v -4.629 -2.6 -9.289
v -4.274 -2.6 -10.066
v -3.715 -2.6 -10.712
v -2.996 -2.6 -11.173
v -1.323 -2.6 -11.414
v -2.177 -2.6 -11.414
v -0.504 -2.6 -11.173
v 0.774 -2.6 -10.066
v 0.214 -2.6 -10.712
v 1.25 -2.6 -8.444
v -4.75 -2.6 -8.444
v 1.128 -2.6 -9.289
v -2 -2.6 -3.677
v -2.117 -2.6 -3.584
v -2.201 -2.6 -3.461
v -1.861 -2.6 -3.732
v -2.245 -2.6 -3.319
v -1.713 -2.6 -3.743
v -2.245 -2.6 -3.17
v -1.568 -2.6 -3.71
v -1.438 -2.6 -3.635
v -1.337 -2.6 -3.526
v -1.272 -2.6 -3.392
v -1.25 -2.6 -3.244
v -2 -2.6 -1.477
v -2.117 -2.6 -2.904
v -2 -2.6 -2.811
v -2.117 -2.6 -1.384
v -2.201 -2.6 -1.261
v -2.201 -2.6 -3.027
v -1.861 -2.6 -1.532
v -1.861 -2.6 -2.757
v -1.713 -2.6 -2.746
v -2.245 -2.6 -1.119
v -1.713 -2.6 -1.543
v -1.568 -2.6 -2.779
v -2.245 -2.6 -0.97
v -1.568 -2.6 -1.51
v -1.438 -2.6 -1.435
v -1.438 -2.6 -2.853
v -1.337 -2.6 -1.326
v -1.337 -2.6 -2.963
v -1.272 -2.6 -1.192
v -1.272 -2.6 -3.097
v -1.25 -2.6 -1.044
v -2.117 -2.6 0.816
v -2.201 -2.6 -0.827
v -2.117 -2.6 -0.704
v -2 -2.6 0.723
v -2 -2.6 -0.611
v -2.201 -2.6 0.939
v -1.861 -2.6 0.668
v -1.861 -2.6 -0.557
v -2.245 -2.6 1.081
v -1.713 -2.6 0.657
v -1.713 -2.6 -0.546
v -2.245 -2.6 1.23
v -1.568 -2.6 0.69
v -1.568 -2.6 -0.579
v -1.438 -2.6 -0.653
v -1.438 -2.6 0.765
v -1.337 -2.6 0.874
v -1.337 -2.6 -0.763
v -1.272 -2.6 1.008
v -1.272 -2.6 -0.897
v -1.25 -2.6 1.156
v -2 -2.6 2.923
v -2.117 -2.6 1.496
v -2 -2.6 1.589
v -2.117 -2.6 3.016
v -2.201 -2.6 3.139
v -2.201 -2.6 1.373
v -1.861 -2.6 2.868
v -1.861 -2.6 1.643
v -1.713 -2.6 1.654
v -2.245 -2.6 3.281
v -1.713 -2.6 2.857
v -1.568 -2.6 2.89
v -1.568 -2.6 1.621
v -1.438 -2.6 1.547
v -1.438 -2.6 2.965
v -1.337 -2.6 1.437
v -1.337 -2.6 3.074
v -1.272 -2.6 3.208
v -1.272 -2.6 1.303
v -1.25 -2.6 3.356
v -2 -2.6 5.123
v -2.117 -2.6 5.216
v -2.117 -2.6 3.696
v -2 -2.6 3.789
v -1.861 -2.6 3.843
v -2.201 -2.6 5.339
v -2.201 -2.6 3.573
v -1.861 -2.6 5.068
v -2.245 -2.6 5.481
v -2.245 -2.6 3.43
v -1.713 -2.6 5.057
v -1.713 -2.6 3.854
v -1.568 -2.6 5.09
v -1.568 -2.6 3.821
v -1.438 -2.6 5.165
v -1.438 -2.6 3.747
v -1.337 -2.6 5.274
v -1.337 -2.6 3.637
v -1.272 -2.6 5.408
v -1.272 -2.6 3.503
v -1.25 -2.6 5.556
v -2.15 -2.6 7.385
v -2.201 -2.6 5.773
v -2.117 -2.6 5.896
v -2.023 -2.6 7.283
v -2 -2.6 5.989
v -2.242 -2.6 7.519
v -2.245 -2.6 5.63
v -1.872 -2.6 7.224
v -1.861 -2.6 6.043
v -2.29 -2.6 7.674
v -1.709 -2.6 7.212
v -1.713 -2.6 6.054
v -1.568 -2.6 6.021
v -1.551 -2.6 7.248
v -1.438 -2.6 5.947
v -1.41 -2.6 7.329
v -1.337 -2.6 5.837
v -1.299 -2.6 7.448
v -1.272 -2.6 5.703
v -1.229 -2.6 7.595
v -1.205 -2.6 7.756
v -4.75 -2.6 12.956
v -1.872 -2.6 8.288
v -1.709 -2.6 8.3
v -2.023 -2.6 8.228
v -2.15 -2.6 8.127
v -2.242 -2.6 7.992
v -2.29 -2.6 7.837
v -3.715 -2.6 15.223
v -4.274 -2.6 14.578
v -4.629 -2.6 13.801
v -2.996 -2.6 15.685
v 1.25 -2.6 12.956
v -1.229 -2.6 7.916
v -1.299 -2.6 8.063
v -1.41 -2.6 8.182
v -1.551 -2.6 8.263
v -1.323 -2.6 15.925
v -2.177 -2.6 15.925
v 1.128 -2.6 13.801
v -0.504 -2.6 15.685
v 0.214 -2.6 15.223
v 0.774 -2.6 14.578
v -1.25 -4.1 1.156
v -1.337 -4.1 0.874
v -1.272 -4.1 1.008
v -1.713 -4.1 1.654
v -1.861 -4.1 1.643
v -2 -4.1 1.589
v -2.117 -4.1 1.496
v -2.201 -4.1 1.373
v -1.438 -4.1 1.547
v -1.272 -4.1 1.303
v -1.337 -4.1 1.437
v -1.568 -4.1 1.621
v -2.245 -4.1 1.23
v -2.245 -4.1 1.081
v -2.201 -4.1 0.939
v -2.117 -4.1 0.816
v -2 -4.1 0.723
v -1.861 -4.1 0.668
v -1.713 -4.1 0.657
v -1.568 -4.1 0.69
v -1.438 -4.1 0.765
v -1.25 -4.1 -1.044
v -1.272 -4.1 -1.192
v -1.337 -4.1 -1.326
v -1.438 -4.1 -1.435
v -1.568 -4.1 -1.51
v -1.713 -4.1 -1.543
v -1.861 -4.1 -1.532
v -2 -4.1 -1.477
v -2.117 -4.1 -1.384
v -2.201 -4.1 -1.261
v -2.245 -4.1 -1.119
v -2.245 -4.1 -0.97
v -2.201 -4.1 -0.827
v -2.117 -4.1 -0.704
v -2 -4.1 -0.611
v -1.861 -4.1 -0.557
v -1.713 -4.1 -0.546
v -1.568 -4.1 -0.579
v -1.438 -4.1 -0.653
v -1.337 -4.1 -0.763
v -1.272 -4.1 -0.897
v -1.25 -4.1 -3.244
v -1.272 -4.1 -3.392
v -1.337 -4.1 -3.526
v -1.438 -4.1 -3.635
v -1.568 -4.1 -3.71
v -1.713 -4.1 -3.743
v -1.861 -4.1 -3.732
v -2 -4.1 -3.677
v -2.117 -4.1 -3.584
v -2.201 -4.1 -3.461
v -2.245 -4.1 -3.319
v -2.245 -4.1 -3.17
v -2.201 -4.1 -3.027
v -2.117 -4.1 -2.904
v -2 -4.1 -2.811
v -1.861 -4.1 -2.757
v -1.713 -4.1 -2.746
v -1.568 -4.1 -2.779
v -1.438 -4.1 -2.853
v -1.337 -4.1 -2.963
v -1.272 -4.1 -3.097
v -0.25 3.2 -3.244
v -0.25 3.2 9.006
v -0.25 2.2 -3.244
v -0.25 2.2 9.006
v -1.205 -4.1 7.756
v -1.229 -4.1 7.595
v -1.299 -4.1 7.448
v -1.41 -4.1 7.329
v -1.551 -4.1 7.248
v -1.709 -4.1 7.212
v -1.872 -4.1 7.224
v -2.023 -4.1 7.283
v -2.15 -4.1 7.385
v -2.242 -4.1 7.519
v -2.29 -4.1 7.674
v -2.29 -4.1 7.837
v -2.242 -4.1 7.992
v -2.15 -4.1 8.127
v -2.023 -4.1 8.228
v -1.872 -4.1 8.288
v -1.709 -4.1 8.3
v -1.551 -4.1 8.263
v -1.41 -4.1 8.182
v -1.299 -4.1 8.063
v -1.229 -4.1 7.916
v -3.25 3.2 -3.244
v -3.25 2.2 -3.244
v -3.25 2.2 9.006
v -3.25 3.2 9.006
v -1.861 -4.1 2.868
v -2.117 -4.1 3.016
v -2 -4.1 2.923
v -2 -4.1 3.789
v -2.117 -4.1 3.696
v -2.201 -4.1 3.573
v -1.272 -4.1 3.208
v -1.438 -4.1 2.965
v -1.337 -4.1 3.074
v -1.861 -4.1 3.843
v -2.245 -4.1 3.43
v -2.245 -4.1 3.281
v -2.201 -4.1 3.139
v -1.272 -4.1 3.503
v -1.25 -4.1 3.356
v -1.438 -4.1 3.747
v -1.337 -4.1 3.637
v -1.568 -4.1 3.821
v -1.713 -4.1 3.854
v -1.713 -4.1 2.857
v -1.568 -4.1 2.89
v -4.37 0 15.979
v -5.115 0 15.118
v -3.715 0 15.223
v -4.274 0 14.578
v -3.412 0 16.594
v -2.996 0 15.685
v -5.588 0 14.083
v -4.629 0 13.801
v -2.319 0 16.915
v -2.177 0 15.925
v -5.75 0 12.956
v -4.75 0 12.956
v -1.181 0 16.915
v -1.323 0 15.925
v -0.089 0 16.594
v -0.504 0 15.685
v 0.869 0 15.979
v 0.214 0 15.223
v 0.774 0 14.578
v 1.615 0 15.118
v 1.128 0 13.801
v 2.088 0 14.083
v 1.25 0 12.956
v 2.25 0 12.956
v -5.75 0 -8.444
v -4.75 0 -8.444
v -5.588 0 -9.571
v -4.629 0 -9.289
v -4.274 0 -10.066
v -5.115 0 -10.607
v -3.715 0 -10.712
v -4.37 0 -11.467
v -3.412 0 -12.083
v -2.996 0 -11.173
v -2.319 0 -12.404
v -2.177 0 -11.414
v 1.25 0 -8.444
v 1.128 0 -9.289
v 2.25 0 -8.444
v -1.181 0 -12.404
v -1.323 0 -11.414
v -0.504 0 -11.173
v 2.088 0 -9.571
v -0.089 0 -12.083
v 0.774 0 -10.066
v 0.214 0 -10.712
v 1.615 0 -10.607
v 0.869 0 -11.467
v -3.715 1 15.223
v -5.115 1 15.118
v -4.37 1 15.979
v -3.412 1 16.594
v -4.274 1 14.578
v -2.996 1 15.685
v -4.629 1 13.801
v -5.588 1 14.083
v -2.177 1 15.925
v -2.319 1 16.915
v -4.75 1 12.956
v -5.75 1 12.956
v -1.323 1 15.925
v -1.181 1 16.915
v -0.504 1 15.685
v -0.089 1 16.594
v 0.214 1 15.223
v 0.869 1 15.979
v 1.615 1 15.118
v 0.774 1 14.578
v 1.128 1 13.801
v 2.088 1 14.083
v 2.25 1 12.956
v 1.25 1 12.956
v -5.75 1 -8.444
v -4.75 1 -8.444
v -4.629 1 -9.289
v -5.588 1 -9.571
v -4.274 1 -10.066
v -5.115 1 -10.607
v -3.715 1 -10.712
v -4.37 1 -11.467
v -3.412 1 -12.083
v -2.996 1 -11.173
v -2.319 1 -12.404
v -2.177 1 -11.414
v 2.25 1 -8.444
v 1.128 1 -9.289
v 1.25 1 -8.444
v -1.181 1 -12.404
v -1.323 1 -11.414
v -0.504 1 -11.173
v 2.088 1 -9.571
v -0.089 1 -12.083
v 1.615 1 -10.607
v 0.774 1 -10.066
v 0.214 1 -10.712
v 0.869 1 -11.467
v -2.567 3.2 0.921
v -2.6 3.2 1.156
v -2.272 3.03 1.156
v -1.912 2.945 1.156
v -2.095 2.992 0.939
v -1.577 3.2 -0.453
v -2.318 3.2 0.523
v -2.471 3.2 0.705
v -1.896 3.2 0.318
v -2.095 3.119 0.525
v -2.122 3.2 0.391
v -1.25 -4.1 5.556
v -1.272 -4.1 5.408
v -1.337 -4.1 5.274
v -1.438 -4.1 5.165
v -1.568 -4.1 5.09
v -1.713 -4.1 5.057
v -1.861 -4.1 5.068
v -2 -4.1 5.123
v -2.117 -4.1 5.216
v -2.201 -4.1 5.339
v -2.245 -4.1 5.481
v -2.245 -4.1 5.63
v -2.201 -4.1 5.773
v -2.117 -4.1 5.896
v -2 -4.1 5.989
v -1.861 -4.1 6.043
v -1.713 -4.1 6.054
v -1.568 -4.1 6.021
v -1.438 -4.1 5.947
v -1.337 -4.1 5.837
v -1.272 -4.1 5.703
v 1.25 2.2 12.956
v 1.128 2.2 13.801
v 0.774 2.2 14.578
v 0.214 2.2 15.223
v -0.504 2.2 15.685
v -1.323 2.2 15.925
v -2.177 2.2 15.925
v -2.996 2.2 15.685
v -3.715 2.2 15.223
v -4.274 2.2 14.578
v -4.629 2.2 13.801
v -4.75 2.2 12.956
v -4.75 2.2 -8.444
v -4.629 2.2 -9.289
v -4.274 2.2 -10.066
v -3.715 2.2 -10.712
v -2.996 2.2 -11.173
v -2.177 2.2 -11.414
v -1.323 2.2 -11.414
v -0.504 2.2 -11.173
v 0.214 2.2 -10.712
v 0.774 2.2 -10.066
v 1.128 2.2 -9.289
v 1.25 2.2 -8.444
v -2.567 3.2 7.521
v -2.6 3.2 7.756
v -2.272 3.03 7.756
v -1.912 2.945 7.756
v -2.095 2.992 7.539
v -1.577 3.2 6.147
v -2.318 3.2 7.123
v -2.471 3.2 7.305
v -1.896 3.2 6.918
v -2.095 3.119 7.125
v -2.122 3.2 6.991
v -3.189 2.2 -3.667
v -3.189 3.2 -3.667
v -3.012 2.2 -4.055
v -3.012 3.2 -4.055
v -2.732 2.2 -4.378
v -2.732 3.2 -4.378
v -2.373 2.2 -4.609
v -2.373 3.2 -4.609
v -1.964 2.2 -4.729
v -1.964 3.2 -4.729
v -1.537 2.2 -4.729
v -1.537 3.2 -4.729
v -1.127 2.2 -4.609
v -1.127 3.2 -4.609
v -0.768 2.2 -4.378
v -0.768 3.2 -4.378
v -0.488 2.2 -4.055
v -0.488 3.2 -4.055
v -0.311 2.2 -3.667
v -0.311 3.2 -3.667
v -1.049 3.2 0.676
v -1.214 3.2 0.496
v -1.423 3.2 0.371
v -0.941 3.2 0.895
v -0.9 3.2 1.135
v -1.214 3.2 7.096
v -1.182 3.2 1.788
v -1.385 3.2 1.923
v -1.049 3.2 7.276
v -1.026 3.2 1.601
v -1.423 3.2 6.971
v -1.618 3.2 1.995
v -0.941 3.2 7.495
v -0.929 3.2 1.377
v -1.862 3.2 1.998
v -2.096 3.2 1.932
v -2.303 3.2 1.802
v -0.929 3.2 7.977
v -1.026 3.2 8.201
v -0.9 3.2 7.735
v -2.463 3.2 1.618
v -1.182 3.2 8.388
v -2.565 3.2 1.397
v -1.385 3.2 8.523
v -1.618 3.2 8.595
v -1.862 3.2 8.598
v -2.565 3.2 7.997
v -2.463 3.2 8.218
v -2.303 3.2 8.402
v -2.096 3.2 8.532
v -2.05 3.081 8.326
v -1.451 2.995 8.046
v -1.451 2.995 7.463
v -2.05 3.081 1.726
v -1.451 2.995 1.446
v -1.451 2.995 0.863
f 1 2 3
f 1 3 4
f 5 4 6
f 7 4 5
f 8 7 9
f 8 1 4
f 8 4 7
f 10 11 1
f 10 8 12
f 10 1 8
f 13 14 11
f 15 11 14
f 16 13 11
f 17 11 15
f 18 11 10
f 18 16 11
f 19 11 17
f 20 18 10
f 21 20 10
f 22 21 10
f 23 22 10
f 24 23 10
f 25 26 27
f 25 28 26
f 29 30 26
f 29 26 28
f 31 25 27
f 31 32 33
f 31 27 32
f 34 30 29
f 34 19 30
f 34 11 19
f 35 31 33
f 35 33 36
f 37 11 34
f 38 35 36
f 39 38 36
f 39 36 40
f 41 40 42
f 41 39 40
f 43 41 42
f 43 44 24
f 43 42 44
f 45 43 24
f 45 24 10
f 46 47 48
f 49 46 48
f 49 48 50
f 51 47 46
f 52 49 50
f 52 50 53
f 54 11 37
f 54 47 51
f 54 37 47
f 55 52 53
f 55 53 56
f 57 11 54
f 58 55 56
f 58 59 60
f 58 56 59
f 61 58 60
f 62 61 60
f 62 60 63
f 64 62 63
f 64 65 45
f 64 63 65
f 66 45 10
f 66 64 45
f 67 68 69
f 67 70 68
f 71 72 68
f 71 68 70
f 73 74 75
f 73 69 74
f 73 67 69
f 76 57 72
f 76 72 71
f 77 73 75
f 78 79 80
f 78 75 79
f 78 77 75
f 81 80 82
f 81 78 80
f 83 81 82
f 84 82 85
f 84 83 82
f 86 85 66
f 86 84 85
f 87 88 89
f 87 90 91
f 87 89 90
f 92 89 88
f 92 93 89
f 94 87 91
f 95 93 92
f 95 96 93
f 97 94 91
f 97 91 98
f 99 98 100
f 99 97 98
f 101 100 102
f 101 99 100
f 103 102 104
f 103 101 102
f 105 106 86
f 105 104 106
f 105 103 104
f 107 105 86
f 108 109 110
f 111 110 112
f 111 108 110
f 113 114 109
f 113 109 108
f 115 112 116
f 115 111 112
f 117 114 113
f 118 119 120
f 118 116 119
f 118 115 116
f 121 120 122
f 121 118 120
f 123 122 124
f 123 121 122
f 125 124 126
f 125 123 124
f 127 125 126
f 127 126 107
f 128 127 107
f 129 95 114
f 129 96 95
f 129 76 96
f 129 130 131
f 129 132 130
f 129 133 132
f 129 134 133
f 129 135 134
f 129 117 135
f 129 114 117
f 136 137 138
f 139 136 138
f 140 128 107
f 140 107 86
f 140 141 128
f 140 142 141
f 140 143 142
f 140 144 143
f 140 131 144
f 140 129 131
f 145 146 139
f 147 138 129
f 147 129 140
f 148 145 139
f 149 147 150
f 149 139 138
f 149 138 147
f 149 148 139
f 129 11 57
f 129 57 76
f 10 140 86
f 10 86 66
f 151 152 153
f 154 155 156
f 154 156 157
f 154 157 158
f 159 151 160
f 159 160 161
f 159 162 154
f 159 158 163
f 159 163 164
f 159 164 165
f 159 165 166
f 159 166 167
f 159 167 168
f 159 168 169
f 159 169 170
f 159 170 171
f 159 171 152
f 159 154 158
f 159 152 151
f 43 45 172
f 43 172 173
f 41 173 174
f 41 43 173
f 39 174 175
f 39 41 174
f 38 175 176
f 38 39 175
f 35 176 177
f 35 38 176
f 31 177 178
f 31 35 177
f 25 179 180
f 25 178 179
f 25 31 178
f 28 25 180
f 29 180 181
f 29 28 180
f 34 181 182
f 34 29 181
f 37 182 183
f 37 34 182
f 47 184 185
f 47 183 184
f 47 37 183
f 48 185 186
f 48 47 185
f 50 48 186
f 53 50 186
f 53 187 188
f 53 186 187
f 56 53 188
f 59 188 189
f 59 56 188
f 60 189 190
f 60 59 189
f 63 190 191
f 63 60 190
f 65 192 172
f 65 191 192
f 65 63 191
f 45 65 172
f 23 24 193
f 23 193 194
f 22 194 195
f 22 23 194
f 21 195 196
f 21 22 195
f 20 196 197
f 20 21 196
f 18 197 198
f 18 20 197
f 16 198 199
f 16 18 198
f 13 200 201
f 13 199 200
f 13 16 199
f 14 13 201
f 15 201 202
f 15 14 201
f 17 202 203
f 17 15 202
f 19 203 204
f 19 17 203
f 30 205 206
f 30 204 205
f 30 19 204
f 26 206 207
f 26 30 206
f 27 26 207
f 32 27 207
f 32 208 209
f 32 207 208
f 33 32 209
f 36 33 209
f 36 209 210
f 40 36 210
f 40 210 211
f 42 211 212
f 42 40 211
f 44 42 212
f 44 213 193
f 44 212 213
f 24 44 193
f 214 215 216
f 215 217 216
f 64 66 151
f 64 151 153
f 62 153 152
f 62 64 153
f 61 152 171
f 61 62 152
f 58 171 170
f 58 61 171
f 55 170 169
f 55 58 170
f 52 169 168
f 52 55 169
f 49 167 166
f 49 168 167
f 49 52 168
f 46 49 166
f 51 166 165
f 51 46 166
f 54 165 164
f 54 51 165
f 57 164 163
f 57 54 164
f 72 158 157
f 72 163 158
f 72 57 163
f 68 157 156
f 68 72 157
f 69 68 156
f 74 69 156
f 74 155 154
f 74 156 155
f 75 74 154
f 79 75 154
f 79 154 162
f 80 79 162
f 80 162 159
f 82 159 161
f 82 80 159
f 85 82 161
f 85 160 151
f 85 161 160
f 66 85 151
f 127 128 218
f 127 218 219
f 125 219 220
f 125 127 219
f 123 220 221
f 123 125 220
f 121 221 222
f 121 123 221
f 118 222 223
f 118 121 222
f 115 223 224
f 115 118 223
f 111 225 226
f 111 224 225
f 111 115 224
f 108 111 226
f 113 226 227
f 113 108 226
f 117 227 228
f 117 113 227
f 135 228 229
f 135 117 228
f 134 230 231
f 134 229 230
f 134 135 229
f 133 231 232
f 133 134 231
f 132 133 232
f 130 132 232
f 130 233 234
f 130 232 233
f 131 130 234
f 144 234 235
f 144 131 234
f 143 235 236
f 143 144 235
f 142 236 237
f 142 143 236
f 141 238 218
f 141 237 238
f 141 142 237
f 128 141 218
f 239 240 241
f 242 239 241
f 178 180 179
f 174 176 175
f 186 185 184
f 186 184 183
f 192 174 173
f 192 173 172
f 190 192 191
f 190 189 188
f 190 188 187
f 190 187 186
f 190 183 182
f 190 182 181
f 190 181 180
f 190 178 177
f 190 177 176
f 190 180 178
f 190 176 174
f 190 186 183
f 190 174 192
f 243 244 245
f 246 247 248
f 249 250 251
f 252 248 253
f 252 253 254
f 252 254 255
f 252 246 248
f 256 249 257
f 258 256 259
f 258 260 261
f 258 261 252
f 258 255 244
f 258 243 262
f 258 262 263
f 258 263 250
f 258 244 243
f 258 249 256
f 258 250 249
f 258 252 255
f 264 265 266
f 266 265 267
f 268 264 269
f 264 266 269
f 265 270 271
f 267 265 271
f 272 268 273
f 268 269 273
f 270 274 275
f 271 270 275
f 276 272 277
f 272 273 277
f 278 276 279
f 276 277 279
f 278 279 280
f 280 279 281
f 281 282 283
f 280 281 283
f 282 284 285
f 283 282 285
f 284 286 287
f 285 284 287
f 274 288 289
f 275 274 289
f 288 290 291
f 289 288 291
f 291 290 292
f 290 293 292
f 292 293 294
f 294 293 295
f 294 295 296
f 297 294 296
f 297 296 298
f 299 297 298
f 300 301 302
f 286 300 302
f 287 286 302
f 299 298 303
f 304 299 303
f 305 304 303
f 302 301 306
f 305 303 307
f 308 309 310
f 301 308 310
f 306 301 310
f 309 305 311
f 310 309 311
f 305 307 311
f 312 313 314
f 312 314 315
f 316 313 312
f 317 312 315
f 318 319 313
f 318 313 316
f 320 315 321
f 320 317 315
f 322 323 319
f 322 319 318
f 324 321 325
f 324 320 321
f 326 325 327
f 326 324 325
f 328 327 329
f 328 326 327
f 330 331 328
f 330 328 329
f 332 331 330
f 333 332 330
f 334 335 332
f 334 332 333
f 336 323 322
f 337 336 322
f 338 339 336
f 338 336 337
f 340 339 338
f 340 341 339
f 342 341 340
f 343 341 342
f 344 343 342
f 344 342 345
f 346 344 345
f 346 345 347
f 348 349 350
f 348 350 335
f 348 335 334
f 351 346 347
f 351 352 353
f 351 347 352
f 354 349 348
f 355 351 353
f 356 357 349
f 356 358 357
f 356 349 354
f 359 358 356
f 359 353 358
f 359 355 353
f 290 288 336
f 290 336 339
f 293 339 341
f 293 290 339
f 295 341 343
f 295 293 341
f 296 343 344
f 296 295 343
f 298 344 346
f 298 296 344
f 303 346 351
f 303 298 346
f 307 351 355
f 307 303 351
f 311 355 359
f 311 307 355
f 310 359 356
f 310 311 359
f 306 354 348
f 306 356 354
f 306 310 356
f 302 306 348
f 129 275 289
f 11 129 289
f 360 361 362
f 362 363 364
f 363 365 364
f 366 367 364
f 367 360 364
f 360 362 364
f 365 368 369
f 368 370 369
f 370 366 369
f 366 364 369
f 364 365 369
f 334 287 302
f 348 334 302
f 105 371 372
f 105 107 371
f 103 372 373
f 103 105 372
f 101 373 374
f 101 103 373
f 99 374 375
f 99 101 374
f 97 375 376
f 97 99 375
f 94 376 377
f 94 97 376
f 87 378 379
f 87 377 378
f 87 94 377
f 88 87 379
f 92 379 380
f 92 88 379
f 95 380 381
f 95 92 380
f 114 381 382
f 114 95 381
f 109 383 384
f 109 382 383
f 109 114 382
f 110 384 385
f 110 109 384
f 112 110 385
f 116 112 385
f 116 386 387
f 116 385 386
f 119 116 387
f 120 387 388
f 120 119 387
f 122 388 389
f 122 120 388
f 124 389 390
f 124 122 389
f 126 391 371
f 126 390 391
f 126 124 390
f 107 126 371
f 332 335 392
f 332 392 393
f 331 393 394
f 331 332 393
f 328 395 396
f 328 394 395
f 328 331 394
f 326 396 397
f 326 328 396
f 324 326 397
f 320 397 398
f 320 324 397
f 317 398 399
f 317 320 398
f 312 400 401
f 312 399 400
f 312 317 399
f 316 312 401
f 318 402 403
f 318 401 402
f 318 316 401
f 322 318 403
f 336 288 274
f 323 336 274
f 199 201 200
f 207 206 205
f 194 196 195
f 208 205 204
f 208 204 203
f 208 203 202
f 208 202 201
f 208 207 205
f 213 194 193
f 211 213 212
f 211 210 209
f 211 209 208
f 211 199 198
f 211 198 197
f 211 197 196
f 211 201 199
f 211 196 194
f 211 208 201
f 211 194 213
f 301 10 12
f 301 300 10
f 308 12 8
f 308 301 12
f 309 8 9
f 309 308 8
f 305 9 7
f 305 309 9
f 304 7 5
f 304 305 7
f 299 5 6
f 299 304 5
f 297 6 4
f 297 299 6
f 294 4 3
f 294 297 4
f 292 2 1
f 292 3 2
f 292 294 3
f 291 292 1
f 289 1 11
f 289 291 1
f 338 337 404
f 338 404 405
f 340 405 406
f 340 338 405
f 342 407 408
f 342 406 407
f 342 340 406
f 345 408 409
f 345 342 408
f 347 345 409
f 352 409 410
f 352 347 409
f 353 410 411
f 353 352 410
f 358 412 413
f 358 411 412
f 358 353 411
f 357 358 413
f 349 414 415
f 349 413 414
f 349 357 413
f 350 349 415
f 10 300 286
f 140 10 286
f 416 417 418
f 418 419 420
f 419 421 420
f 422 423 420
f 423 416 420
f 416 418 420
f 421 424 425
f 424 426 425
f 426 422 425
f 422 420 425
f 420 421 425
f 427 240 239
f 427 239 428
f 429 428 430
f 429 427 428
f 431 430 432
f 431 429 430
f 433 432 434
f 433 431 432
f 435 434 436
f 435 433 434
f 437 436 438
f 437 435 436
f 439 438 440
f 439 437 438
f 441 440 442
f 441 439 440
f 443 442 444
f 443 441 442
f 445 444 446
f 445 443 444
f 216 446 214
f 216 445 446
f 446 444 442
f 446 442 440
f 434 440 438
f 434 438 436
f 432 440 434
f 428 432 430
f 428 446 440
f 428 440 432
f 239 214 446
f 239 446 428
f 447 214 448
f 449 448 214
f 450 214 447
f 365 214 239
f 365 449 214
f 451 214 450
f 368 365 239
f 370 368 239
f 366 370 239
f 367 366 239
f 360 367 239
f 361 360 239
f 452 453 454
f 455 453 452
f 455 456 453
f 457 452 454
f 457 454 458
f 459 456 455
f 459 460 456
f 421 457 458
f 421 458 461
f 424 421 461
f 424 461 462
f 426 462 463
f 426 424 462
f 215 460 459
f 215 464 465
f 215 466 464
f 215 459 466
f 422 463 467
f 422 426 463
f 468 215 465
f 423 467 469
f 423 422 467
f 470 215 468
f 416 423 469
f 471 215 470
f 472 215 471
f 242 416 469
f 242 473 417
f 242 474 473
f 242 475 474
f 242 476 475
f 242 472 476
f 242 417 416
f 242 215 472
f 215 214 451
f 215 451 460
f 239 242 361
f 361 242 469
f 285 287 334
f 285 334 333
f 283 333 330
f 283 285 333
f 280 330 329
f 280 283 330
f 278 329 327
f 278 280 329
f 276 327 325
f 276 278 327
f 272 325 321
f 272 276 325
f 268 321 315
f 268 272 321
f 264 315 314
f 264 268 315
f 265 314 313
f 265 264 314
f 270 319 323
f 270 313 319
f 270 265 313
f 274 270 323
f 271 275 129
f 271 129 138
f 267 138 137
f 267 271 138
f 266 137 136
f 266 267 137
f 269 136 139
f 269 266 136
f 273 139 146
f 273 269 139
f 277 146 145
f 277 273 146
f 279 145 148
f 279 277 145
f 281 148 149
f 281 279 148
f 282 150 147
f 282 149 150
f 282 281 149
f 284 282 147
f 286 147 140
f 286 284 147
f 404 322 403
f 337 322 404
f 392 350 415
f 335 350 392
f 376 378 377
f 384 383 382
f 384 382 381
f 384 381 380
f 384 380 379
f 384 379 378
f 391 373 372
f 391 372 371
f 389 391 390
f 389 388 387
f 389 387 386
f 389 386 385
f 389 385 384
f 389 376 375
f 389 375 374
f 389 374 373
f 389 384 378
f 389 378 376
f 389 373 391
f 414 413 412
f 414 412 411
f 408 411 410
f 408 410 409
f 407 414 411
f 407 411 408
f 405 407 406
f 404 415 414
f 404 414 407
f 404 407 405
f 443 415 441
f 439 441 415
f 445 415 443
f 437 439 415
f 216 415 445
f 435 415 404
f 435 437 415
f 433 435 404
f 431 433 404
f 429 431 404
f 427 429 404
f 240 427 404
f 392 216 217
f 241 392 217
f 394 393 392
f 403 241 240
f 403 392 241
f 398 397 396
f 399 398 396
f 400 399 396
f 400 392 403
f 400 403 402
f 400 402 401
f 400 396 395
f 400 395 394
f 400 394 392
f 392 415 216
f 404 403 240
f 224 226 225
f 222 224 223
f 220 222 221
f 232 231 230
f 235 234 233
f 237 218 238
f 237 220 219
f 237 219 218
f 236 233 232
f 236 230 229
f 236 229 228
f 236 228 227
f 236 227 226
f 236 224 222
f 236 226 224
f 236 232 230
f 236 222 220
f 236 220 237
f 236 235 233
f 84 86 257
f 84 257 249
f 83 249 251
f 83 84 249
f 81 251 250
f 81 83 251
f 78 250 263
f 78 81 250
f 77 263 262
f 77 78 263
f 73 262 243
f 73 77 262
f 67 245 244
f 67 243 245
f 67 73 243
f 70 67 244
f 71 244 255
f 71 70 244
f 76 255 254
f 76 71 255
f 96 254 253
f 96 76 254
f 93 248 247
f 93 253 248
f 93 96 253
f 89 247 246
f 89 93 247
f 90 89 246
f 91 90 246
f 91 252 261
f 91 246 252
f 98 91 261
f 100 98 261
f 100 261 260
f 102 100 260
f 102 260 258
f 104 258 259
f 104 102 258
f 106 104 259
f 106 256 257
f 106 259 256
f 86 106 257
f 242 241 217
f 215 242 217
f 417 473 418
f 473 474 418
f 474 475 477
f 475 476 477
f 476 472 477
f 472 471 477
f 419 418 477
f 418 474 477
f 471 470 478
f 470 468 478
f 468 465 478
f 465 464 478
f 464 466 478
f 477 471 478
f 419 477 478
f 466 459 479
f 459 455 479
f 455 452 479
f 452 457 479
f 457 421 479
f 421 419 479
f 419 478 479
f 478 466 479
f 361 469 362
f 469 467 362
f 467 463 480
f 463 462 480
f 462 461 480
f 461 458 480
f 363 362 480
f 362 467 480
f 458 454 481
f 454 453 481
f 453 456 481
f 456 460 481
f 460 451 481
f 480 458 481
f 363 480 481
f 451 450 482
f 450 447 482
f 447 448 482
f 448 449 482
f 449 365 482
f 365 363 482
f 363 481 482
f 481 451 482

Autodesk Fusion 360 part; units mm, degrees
sketch "Sketch1" plane through (0, 0, 0) normal (0, 1, 0) x (1, 0, 0)
  line L0 (-5.7502, 8.4443) -> (-5.7502, -12.9557)
  arc A0 (-5.7502, -12.9557) -> (2.2498, -12.9557) centre (-1.7502, -12.9557) ccw
  line L1 (2.2498, -12.9557) -> (2.2498, 8.4443)
  arc A1 (2.2498, 8.4443) -> (-5.7502, 8.4443) centre (-1.7502, 8.4443) ccw
  line L2 (-1.7502, 8.4443) -> (-1.7502, -12.9557) construction
  point P0 (-1.7502, 12.4443)
  point P1 (-1.7502, -16.9557)
  dimension "d1" = 29.4
  dimension "d2" = 8
extrude "Extrude1" add sketch "Sketch1" along normal blind 1
sketch "Sketch2" plane through (0, 0, 0) normal (0, -1, 0) x (1, 0, 0)
  arc A0 (-5.7502, -8.4443) -> (2.2498, -8.4443) centre (-1.7502, -8.4443) ccw
  line L0 (2.2498, -8.4443) -> (2.2498, 12.9557)
  arc A1 (2.2498, 12.9557) -> (-5.7502, 12.9557) centre (-1.7502, 12.9557) ccw
  line L1 (-5.7502, 12.9557) -> (-5.7502, -8.4443)
  arc A2 (-4.7502, -8.4443) -> (1.2498, -8.4443) centre (-1.7502, -8.4443) ccw
  line L2 (1.2498, -8.4443) -> (1.2498, 12.9557)
  arc A3 (1.2498, 12.9557) -> (-4.7502, 12.9557) centre (-1.7502, 12.9557) ccw
  line L3 (-4.7502, 12.9557) -> (-4.7502, -8.4443)
  dimension "d5" = -1
  dimension "d6" = 6
extrude "Extrude2" add sketch "Sketch2" along normal blind 2.6 contours A2 L2 A3 L3
sketch "Sketch3" plane through (0, 1, 0) normal (0, 1, 0) x (-1, 0, 0)
  arc A0 (-2.2498, -8.4443) -> (5.7502, -8.4443) centre (1.7502, -8.4443) ccw
  line L0 (5.7502, -8.4443) -> (5.7502, 12.9557)
  arc A1 (5.7502, 12.9557) -> (-2.2498, 12.9557) centre (1.7502, 12.9557) ccw
  line L1 (-2.2498, 12.9557) -> (-2.2498, -8.4443)
  line L2 (1.7502, -12.4443) -> (1.7502, 16.9557) construction
  line L3 (0.2502, 7.7557) -> (0.2502, -3.2443)
  arc A2 (0.2502, -3.2443) -> (3.2502, -3.2443) centre (1.7502, -3.2443) ccw
  line L4 (3.2502, -3.2443) -> (3.2502, 7.7557)
  arc A3 (3.2502, 7.7557) -> (0.2502, 7.7557) centre (1.7502, 7.7557) ccw
  line L5 (1.7502, 7.7557) -> (1.7502, -3.2443) construction
  line L6 (3.2502, 7.7557) -> (3.2502, 9.0057)
  line L7 (3.2502, 9.0057) -> (0.2502, 9.0057)
  line L8 (0.2502, 9.0057) -> (0.2502, 7.7557)
  circle A4 centre (1.7502, -3.2443) radius 0.85
  circle A5 centre (1.7502, -1.0443) radius 0.85
  circle A6 centre (1.7502, 1.1557) radius 0.85
  circle A7 centre (1.7502, 3.3557) radius 0.85
  circle A8 centre (1.7502, 5.5557) radius 0.85
  circle A9 centre (1.7502, 7.7557) radius 0.85
  point P0 (1.7502, 2.2557)
  point P1 (1.7502, -4.7443)
  dimension "d9" = 7
  dimension "d10" = 3
  dimension "d11" = 1.25
  dimension "d12" = 5.5
  dimension "d13" = 1.7
  dimension "d16" = 0
  dimension "d17" = 11
extrude "Extrude3" add sketch "Sketch3" along normal blind 2.2 contours L3 A2 L4 A3 L7 | A3 L7 L8 | A3 L6 L7 | A4 | A5 | A6 | A7 | A8 | A9
sketch "Sketch4" plane through (0, 1, 0) normal (0, 1, 0) x (-1, 0, 0)
  line L0 (0.2502, 9.0057) -> (3.2502, 9.0057)
  line L1 (3.2502, 9.0057) -> (3.2502, -3.2443)
  arc A0 (0.2502, -3.2443) -> (3.2502, -3.2443) centre (1.7502, -3.2443) ccw
  line L2 (0.2502, -3.2443) -> (0.2502, 9.0057)
  arc A1 (-2.2498, -8.4443) -> (5.7502, -8.4443) centre (1.7502, -8.4443) ccw
  line L3 (5.7502, -8.4443) -> (5.7502, 12.9557)
  arc A2 (5.7502, 12.9557) -> (-2.2498, 12.9557) centre (1.7502, 12.9557) ccw
  line L4 (-2.2498, 12.9557) -> (-2.2498, -8.4443)
  line L5 (4.7502, 12.9557) -> (4.7502, -8.4443)
  arc A3 (-1.2498, -8.4443) -> (4.7502, -8.4443) centre (1.7502, -8.4443) ccw
  line L6 (-1.2498, -8.4443) -> (-1.2498, 12.9557)
  arc A4 (4.7502, 12.9557) -> (-1.2498, 12.9557) centre (1.7502, 12.9557) ccw
extrude "Extrude4" add sketch "Sketch4" along normal blind 1.2 contours L5 A3 L6 A4
sketch "Sketch5" plane through (0, -2.6, 0) normal (0, -1, 0) x (1, 0, 0)
  line L0 (-4.7502, 12.9557) -> (-4.7502, -8.4443)
  arc A0 (-4.7502, -8.4443) -> (1.2498, -8.4443) centre (-1.7502, -8.4443) ccw
  line L1 (1.2498, -8.4443) -> (1.2498, 12.9557)
  arc A1 (1.2498, 12.9557) -> (-4.7502, 12.9557) centre (-1.7502, 12.9557) ccw
  line L2 (-0.2502, 9.0057) -> (-0.2502, -3.2443)
  arc A2 (-3.2502, -3.2443) -> (-0.2502, -3.2443) centre (-1.7502, -3.2443) ccw
  line L3 (-3.2502, -3.2443) -> (-3.2502, 9.0057)
  line L4 (-3.2502, 9.0057) -> (-0.2502, 9.0057)
  circle A3 centre (-1.7502, 7.7557) radius 0.5455
  circle A4 centre (-1.7502, 5.5557) radius 0.5
  circle A5 centre (-1.7502, 3.3557) radius 0.5
  circle A6 centre (-1.7502, 1.1557) radius 0.5
  circle A7 centre (-1.7502, -1.0443) radius 0.5
  circle A8 centre (-1.7502, -3.2443) radius 0.5
  dimension "d22" = 1
extrude "Extrude5" add sketch "Sketch5" along normal blind 1.5 contours A3 | A4 | A5 | A6 | A7 | A8
sketch "Sketch6" plane through (0, 3.2, 0) normal (0, 1, 0) x (-1, 0, 0)
  line L0 (0.2502, 9.0057) -> (0.2502, -3.2443)
  arc A0 (0.2502, -3.2443) -> (3.2502, -3.2443) centre (1.7502, -3.2443) ccw
  line L1 (3.2502, -3.2443) -> (3.2502, 9.0057)
  line L2 (3.2502, 9.0057) -> (0.2502, 9.0057)
  circle A1 centre (1.7502, 7.7557) radius 0.85
  line L3 (0.9002, 7.7557) -> (2.6002, 7.7557)
  point P0 (1.7502, 7.7557)
ref_plane "WorkPlane1" through (-1.7502, 3.2, 7.7557) normal (0, 0, 1) x (-1, 0, 0)
sketch "Sketch7" plane through (-1.7502, 3.2, 7.7557) normal (0, 0, 1) x (1, 0, 0)
  circle A0 centre (0, 1.2359) radius 1.5
  line L0 (1.5, 1.2359) -> (-1.5, 1.2359)
  point P0 (-0.85, 0)
  point P1 (0.85, 0)
  dimension "d26" = 3
revolve "Revolve1" cut sketch "Sketch7" angle 360 about axis through (-0.2502, 4.4359, 7.7557) along (-1, 0, 0) contours A0 L0 picked at (-0.3665, 0.8958)
pattern_linear "R-Pattern1" count 6 spacing 2.2 along (0, 0, -1) of "Revolve1"
